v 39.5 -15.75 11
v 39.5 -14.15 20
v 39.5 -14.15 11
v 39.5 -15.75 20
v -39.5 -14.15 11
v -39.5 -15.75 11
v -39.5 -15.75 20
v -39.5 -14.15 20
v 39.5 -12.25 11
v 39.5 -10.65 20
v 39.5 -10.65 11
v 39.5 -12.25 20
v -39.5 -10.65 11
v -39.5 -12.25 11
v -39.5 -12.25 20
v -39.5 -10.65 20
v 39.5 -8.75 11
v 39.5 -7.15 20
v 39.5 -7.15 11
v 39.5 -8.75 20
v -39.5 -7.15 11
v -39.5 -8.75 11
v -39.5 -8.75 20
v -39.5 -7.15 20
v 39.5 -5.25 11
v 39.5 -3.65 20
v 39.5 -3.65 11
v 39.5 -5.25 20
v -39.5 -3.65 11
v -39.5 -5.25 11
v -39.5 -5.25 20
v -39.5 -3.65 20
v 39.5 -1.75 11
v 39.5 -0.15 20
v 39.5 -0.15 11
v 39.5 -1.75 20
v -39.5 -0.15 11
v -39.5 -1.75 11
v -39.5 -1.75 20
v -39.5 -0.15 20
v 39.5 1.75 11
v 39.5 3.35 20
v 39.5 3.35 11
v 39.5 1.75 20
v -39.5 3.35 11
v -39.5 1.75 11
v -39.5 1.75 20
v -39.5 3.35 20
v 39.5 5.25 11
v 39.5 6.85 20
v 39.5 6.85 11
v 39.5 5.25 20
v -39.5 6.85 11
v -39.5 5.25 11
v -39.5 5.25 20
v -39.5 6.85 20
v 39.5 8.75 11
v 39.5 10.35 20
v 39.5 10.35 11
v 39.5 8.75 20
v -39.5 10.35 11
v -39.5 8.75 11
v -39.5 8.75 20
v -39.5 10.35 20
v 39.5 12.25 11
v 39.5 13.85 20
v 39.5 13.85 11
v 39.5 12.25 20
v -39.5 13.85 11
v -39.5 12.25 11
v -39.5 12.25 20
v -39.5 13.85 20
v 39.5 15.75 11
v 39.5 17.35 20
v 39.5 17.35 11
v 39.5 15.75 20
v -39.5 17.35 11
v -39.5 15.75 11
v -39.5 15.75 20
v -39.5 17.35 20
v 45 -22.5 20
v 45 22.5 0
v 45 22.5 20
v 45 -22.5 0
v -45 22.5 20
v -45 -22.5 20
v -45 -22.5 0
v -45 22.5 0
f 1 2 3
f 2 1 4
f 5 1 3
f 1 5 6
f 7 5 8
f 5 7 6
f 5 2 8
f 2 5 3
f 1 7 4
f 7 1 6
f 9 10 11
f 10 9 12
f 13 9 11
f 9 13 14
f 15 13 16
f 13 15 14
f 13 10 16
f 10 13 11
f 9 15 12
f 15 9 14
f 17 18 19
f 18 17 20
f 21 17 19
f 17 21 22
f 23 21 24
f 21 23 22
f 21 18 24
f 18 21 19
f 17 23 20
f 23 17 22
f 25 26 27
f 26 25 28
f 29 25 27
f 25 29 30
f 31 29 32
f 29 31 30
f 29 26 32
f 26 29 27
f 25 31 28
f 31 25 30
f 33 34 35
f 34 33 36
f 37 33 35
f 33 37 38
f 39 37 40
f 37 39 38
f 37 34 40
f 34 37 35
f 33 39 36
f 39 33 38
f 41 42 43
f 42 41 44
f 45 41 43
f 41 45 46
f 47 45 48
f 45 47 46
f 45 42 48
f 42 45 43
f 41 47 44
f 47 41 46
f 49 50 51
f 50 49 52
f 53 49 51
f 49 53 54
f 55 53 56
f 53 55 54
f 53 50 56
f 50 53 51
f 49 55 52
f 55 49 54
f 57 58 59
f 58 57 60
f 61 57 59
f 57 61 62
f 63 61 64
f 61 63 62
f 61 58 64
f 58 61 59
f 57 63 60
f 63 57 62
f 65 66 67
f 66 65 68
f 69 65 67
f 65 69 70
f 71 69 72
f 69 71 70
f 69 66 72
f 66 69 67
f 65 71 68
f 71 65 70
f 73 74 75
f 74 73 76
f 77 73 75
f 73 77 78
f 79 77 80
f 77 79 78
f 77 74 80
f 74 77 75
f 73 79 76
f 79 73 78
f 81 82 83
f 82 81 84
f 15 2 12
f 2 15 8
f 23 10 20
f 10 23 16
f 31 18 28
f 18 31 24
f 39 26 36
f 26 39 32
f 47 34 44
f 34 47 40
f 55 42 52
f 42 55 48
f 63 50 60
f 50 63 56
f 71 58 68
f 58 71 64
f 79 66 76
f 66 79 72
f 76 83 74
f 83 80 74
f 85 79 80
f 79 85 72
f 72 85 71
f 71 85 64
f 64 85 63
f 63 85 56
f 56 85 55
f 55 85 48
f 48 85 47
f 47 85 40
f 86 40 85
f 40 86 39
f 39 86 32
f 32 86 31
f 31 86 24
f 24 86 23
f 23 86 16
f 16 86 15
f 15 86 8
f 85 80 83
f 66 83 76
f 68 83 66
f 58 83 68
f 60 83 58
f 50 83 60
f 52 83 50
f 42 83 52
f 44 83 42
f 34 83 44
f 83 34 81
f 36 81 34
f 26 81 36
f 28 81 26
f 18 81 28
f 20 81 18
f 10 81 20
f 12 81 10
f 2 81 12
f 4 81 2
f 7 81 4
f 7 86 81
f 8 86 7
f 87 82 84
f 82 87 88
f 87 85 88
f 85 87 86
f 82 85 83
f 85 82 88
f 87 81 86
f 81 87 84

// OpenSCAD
// Drying rack for 10 microscope slides (75 x 25 x 1 mm)
// Slides stand upright on their long edge, held in slots cut into the top face.

// --- Base block dimensions ---
base_L = 90;   // length along X (mm)
base_W = 45;   // width along Y (mm)
base_H = 20;   // height along Z (mm)

// --- Slot dimensions ---
slot_L = 77;   // slot length along X (mm)
slot_W = 1.6;  // slot width along Y (mm)
slot_D = 10;   // slot depth into the block (mm)

// --- Slot layout ---
n_slots = 10;          // number of slots
slot_pitch = 3.5;      // centre-to-centre spacing along Y (mm)

// --- Derived values ---
// Total span of slot centres (first to last)
span = (n_slots - 1) * slot_pitch;   // 9 * 3.5 = 31.5 mm
// Y position of the first slot centre (so the group is centred on Y=0)
y_first = -span / 2;

// --- Build ---
$fn = 64;

// Solid base block, centred on origin in X and Y, resting on z=0
module base() { translate([-base_L/2, -base_W/2, 0])
    cube([base_L, base_W, base_H]); }

// Cutting tool: one slot, extended 1 mm past the top face (z = base_H + 1)
// and 1 mm past the X faces so no faces are exactly coplanar.
// Each slot is a box of size (slot_L + 2) x slot_W x (slot_D + 1),
// positioned so its top is at z = base_H + 1 and it cuts 10 mm into the block.
module slot_tool() { translate([-slot_L/2 - 1, 0, base_H + 1 - slot_D])
    cube([slot_L + 2, slot_W, slot_D + 1]); }

// Difference: base minus all 10 slots
difference() {
    base();
    for (i = [0 : n_slots - 1]) {
        y_i = y_first + i * slot_pitch;
        translate([0, y_i, 0])
            slot_tool();
    }
}
